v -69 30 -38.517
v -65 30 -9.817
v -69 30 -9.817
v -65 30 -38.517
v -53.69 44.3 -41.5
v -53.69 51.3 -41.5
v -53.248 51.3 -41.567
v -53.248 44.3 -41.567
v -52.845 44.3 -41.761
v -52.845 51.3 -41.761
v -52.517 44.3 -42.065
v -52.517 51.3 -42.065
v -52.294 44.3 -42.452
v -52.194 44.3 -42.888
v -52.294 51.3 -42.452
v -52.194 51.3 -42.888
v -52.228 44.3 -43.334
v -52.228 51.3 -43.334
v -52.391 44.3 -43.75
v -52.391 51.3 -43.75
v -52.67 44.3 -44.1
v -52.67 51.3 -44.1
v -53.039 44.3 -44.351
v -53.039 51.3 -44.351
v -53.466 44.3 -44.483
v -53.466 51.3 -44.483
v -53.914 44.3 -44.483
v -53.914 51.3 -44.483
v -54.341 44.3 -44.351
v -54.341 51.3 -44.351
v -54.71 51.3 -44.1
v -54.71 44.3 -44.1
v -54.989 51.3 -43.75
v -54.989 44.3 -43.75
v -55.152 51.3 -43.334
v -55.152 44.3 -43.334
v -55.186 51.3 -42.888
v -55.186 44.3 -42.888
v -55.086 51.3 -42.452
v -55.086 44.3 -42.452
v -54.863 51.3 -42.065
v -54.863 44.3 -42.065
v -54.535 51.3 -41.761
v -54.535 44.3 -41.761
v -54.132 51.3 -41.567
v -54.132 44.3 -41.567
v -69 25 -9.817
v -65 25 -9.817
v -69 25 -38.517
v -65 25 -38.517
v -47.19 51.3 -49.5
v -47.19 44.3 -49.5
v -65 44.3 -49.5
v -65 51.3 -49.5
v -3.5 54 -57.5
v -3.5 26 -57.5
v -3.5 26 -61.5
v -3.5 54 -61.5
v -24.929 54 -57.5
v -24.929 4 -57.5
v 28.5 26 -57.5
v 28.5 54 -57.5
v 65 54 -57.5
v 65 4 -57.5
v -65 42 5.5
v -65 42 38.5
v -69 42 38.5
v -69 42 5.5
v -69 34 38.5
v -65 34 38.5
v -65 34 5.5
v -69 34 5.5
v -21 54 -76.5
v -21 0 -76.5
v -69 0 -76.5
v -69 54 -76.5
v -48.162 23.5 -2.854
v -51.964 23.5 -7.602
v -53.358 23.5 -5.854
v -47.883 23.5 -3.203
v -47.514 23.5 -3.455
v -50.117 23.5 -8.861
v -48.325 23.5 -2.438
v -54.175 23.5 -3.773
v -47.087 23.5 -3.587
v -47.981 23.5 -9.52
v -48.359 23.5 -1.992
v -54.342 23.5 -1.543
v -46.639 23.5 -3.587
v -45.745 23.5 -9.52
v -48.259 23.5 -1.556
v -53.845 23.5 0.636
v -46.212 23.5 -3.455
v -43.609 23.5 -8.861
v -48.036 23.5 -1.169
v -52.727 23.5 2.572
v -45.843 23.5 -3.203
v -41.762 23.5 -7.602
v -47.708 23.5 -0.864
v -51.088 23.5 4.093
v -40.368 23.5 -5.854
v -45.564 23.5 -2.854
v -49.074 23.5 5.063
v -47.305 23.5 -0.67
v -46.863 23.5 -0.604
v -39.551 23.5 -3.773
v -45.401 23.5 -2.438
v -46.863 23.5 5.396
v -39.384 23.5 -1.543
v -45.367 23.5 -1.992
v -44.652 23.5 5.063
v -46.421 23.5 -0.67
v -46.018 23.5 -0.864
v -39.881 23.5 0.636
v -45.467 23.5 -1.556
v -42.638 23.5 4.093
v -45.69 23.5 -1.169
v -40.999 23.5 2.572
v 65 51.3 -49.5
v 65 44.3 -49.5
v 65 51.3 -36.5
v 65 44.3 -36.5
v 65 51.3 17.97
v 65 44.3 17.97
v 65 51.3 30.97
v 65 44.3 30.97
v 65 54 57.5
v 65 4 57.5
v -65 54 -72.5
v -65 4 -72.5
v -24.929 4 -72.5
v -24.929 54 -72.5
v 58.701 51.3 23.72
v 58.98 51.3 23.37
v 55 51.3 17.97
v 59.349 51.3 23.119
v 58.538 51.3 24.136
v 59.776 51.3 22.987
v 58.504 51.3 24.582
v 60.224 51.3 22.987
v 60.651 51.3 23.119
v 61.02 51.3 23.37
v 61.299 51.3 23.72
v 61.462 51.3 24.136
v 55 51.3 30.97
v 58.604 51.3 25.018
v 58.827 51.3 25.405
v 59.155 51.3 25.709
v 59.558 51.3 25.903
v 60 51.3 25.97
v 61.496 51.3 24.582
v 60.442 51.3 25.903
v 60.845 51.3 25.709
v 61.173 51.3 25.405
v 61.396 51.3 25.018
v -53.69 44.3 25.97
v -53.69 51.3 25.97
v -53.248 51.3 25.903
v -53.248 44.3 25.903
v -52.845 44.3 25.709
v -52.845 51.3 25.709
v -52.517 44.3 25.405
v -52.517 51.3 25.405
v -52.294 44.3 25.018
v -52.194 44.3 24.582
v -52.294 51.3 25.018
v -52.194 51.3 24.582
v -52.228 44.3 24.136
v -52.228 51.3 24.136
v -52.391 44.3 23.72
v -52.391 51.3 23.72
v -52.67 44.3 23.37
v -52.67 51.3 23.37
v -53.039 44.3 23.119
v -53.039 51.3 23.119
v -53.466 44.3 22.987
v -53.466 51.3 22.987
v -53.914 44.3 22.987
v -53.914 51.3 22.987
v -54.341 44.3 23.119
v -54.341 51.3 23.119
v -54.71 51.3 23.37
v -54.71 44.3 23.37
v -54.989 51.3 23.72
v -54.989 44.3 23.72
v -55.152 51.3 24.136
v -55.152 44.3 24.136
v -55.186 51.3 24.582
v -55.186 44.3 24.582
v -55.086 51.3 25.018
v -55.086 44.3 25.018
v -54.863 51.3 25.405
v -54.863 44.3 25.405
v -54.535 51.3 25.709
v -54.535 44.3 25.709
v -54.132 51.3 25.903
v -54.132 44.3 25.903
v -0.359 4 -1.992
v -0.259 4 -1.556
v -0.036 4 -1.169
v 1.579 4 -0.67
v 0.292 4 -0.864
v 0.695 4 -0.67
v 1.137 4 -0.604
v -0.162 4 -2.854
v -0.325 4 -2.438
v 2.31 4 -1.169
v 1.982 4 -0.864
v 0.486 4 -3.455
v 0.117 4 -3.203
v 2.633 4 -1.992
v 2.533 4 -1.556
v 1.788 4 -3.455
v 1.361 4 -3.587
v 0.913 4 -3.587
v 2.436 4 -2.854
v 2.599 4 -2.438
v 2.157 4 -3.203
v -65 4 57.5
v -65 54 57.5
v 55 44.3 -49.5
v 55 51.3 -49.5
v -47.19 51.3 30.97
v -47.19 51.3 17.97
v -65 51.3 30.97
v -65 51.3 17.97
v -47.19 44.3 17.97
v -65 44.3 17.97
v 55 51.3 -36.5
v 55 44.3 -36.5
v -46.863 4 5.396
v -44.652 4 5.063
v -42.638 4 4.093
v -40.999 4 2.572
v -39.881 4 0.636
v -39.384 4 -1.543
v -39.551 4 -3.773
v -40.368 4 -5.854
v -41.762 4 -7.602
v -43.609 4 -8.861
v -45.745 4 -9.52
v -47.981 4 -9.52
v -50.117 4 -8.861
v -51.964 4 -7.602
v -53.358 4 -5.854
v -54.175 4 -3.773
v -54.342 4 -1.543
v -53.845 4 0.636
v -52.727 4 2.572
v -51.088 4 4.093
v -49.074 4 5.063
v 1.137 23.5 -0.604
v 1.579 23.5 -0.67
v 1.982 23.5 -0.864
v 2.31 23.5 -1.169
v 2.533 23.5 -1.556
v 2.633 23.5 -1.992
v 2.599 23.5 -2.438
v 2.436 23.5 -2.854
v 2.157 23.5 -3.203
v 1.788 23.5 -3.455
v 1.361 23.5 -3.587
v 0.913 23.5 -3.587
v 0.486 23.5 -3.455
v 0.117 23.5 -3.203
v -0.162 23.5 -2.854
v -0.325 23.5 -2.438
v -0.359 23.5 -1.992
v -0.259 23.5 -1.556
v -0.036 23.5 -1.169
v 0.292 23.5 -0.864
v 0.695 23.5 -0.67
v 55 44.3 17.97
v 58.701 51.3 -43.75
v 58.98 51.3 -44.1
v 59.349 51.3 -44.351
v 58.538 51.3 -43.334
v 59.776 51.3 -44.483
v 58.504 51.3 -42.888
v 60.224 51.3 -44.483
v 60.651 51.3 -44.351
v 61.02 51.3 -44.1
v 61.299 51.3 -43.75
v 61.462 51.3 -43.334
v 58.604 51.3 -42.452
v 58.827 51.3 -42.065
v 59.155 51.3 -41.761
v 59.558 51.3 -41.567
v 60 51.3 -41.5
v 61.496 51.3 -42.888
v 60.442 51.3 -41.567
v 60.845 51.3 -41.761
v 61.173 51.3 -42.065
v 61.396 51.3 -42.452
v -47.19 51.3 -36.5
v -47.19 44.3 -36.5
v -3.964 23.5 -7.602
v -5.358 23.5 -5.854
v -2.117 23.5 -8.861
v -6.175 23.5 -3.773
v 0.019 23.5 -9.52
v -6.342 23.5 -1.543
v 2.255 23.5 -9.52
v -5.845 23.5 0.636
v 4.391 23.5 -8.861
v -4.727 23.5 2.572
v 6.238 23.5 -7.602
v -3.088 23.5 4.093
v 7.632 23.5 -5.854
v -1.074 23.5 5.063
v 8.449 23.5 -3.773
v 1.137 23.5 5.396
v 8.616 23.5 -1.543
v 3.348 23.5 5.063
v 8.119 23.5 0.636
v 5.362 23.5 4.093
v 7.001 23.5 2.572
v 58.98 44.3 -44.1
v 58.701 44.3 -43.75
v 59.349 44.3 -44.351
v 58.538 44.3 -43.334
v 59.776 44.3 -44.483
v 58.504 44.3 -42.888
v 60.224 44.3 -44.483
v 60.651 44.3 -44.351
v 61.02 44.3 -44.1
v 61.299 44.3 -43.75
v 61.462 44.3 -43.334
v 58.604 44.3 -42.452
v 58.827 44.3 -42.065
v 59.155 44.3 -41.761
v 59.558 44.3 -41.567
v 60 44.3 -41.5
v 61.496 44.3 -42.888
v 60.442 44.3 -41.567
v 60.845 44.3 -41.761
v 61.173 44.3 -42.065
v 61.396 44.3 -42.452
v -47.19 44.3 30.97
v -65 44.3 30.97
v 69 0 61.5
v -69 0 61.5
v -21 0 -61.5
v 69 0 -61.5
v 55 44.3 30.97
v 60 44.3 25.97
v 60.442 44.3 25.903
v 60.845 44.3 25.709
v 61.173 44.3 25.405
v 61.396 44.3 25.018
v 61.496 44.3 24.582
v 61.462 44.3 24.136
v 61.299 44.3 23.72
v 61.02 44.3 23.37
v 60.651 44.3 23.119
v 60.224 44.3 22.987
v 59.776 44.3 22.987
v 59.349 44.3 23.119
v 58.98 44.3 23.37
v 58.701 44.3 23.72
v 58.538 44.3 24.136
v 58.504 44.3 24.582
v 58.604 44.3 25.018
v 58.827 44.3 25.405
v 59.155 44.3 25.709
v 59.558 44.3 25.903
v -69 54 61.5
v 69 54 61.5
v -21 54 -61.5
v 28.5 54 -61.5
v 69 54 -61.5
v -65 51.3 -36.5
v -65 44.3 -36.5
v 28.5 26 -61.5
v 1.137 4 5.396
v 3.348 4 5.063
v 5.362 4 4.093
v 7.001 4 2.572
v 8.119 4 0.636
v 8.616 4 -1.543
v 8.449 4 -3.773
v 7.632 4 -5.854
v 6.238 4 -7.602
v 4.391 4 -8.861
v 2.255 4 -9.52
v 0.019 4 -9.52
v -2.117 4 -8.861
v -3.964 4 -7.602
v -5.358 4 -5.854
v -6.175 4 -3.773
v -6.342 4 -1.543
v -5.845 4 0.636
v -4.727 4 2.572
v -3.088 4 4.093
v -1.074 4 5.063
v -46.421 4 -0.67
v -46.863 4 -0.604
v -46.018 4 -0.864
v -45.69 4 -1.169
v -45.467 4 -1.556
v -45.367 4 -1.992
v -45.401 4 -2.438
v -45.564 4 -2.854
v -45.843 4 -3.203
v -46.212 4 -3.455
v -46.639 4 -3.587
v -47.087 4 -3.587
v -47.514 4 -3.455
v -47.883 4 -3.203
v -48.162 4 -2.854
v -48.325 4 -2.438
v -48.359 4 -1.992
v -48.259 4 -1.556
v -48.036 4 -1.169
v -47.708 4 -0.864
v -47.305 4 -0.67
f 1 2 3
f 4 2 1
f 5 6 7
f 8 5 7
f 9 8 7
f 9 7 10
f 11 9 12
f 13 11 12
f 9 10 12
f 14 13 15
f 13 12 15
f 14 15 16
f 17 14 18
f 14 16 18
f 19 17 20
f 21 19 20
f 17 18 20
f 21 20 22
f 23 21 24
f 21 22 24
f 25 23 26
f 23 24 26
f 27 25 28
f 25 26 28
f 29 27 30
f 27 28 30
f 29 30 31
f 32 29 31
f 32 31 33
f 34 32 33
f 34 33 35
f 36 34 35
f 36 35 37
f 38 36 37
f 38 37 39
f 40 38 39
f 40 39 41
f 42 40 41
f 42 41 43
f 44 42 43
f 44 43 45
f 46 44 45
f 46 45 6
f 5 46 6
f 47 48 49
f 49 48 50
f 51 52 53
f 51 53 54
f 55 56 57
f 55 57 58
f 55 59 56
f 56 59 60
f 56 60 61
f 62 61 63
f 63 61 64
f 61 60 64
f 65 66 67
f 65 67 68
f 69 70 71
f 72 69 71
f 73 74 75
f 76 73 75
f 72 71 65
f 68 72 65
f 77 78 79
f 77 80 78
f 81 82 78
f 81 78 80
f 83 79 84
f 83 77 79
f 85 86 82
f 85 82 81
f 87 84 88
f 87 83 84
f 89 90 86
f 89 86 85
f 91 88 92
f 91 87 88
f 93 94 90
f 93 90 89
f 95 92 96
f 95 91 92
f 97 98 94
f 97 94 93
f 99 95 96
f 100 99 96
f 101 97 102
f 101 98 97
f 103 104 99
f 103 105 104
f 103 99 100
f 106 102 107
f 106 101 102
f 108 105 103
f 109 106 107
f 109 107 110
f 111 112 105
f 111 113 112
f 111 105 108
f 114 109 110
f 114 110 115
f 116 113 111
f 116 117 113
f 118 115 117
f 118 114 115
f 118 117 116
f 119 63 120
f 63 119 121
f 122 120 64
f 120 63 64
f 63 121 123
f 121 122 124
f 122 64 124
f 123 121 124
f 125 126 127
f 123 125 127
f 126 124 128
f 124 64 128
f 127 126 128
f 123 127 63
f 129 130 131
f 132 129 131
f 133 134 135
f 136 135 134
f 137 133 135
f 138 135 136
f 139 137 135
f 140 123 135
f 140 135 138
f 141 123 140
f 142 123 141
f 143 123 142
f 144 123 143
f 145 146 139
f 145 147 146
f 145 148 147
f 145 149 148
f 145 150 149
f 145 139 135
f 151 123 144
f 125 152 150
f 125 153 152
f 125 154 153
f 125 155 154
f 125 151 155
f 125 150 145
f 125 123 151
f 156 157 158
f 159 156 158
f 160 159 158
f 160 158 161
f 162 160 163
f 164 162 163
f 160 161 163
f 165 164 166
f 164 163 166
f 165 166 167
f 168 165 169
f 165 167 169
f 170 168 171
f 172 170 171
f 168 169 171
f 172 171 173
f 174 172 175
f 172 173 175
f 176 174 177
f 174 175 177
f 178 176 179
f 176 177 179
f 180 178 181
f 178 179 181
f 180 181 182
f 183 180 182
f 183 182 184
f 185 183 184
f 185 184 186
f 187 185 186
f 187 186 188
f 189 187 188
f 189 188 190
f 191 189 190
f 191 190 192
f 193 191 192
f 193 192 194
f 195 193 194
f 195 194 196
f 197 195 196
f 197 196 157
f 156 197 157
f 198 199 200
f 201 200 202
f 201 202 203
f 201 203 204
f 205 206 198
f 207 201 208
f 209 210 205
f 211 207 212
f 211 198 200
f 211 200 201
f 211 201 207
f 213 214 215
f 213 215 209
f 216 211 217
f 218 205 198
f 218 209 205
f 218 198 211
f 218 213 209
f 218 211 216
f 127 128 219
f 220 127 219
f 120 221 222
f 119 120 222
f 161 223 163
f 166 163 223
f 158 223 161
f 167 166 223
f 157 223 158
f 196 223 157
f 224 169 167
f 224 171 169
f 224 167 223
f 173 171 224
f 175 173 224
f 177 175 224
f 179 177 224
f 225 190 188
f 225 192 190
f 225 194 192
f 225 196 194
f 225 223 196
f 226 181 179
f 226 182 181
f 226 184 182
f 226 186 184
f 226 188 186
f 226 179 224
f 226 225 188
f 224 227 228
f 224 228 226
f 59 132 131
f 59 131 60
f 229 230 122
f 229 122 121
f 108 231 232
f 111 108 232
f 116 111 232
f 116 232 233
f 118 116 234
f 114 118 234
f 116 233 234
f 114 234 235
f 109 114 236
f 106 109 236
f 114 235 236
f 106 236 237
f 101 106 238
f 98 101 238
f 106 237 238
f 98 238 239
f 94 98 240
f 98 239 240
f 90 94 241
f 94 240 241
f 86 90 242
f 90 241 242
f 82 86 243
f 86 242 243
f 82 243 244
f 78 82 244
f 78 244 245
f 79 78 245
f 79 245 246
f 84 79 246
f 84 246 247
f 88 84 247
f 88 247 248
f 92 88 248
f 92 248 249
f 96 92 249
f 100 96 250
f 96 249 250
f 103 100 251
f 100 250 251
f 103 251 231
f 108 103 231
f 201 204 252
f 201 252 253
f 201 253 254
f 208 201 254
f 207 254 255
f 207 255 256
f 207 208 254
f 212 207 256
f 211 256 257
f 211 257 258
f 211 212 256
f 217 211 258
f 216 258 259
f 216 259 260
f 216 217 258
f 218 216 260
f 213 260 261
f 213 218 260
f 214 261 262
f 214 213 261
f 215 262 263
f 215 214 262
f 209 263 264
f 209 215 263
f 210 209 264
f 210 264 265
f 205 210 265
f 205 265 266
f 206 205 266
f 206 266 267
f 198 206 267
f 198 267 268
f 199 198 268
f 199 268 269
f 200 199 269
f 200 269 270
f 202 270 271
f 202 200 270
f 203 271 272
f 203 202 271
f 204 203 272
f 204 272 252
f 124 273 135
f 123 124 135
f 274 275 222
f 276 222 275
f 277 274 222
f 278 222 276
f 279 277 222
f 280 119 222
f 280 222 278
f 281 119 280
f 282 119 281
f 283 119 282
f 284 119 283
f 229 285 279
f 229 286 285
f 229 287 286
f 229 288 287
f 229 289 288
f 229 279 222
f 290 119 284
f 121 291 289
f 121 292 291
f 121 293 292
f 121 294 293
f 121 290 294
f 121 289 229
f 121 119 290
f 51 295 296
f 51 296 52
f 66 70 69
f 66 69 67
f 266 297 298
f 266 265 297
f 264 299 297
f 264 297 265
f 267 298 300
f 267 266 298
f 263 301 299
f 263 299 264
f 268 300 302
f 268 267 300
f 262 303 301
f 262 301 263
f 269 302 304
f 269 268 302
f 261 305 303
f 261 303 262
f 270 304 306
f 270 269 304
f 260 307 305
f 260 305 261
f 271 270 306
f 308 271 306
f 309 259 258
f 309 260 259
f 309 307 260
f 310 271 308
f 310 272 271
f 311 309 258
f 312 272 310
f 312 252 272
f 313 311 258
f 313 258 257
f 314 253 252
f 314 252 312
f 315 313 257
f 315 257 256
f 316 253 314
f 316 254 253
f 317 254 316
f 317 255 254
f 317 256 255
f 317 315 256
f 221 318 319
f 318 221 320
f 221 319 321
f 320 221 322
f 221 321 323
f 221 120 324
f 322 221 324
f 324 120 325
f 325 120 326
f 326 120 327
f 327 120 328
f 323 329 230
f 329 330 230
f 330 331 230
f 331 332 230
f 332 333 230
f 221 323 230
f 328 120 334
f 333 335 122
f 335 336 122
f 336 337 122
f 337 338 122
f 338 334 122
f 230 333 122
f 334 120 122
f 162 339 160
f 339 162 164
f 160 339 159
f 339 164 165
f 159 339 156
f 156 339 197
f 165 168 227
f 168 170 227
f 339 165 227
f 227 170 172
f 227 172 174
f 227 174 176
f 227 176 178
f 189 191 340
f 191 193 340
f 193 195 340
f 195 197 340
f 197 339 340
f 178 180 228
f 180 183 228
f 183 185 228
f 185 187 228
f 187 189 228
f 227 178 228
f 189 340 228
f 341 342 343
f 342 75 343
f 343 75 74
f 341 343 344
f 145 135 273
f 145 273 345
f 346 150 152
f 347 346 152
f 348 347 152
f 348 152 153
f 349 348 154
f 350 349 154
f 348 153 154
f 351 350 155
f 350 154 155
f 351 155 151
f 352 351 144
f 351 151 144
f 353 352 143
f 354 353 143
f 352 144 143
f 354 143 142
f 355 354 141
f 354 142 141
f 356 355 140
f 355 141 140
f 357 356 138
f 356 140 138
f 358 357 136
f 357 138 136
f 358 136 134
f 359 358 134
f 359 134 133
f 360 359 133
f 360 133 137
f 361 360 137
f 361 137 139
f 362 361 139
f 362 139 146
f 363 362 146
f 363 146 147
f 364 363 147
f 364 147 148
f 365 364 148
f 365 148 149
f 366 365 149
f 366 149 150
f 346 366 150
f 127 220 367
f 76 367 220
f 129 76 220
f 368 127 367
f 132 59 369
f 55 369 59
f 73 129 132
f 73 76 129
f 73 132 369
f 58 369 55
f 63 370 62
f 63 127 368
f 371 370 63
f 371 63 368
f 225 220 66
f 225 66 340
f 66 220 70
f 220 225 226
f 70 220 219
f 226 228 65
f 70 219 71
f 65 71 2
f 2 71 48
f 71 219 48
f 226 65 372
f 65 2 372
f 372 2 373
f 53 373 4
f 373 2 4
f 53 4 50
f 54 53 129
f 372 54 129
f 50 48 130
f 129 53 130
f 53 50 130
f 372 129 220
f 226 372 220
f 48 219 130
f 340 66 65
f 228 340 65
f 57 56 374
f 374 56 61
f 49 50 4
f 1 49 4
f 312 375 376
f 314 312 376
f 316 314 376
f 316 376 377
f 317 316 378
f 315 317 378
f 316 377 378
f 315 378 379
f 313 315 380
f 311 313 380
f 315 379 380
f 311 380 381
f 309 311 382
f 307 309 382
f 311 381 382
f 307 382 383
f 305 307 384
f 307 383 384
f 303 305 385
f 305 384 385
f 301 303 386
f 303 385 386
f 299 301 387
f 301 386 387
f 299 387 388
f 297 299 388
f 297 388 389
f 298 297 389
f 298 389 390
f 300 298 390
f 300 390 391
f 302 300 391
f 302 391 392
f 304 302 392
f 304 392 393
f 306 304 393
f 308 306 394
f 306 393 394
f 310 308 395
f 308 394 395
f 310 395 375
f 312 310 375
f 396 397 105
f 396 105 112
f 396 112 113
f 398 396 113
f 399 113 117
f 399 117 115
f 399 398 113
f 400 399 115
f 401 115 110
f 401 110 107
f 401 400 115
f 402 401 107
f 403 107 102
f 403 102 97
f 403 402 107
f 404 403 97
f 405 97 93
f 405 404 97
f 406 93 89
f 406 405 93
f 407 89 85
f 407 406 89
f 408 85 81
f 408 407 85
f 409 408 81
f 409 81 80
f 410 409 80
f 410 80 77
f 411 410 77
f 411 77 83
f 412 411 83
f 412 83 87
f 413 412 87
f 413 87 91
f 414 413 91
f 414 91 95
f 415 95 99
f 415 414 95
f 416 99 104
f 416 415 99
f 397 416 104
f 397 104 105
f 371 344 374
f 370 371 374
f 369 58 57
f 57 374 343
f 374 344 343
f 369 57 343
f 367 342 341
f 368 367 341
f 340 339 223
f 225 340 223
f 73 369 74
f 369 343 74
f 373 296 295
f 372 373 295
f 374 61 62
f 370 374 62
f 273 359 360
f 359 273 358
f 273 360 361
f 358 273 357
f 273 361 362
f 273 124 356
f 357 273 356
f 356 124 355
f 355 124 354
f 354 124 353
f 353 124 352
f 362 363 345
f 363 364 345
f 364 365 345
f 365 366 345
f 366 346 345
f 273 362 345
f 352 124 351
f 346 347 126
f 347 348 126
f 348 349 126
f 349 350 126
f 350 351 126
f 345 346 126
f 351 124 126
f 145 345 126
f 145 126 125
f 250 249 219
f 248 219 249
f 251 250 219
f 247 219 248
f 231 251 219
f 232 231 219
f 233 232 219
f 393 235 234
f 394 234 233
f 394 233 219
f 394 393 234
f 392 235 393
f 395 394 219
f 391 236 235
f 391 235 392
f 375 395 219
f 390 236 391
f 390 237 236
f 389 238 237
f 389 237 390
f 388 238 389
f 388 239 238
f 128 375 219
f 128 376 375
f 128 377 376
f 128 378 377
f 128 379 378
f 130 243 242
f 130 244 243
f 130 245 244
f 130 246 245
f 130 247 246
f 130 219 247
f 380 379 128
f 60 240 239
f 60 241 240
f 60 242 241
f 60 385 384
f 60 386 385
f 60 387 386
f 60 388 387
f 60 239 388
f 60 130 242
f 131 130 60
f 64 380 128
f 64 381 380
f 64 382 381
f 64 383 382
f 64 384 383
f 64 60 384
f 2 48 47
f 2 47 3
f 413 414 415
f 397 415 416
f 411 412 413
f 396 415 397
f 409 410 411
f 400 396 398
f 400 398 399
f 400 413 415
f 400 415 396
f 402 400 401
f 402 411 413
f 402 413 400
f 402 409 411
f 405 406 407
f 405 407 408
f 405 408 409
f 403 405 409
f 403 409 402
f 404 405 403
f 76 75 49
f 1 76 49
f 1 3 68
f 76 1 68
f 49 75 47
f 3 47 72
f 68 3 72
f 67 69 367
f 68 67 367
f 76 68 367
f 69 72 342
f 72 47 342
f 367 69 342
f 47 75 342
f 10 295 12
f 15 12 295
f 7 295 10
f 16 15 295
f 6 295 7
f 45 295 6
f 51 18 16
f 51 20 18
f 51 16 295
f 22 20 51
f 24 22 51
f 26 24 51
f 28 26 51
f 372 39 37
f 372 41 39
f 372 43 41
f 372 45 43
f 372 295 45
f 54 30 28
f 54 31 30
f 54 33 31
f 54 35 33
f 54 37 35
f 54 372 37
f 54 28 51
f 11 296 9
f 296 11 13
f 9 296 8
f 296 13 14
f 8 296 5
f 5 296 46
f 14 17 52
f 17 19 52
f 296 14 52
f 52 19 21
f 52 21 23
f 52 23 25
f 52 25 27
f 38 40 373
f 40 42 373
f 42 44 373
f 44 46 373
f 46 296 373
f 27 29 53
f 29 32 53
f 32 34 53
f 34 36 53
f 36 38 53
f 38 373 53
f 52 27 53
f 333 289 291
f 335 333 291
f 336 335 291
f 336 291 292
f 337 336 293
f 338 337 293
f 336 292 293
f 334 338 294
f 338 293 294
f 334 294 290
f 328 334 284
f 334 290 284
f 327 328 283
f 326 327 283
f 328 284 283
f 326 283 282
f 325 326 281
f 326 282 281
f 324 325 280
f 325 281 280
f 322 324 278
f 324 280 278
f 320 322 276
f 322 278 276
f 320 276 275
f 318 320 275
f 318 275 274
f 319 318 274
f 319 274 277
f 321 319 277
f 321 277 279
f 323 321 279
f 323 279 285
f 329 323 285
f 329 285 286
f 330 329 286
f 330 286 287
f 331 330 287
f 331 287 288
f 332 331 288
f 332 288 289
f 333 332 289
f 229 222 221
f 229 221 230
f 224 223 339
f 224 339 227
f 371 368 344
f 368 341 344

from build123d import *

# Parameters (mm, degrees)
BOSS_EXTRUDE1_DEPTH = 4
BOSS_EXTRUDE2_START = 4
BOSS_EXTRUDE2_DEPTH = 50
SKETCH3_R           = 7.5
SKETCH3_R_2         = 1.5
BOSS_EXTRUDE3_DEPTH = 19.5
SKETCH4_W           = 13
SKETCH4_H           = 7
BOSS_EXTRUDE4_DEPTH = 17.81
SKETCH5_W           = 13
SKETCH5_H           = 7
BOSS_EXTRUDE5_DEPTH = 10
CUT_EXTRUDE1_REACH  = 117.087
SKETCH6_R           = 1.5
CUT_EXTRUDE2_REACH  = 149.777
SKETCH7_W           = 32
SKETCH7_H           = 28
CUT_EXTRUDE3_REACH  = 165.476
SKETCH8_W           = 33
SKETCH8_H           = 8
SKETCH8_W_2         = 28.7
SKETCH8_H_2         = 5


with BuildPart() as part:
    # Sketch1 → Boss-Extrude1 (new body)
    with BuildSketch(Plane(origin=(0, 0, 0), x_dir=(1, 0, 0), z_dir=(0, 1, 0))):
        Polygon((-69, -61.5), (69, -61.5), (69, 61.5), (-21, 61.5), (-21, 76.5), (-69, 76.5), (-69, 61.5), align=None)
    extrude(amount=BOSS_EXTRUDE1_DEPTH)

    # Sketch1<5> → Boss-Extrude2 (add)
    with BuildSketch(Plane(origin=(0, 0, 0), x_dir=(1, 0, 0), z_dir=(0, 1, 0)).offset(BOSS_EXTRUDE2_START)):
        Polygon((-69, 61.5), (-69, -61.5), (69, -61.5), (69, 61.5), (-21, 61.5), (-21, 76.5), (-69, 76.5), align=None)
        Polygon((-65, -57.5), (-65, 57.5), (-65, 72.5), (-24.92925867, 72.5), (-24.92925867, 57.5), (65, 57.5), (65, -57.5), align=None, mode=Mode.SUBTRACT)
    extrude(amount=BOSS_EXTRUDE2_DEPTH)

    # Sketch3 → Boss-Extrude3 (add)
    # profile 1 of 2: a face of its own
    with BuildSketch(Plane(origin=(0, 4, 0), x_dir=(1, 0, 0), z_dir=(0, 1, 0))):
        with Locations(Location((-46.862948708, 2.10374449, 0), (0, 0, 270))):
            Circle(SKETCH3_R)
        with Locations(Location((-46.862948708, 2.10374449, 0), (0, 0, 270))):
            Circle(SKETCH3_R_2, mode=Mode.SUBTRACT)
    # profile 2 of 2: a face of its own
    with BuildSketch(Plane(origin=(0, 4, 0), x_dir=(1, 0, 0), z_dir=(0, 1, 0))):
        with Locations(Location((1.137051292, 2.10374449, 0), (0, 0, 270))):
            Circle(SKETCH3_R)
        with Locations(Location((1.137051292, 2.10374449, 0), (0, 0, 270))):
            Circle(SKETCH3_R_2, mode=Mode.SUBTRACT)
    extrude(amount=BOSS_EXTRUDE3_DEPTH)

    # Sketch4 → Boss-Extrude4 (add)
    with BuildSketch(Plane(origin=(-65, 0, 0), x_dir=(0, 0, -1), z_dir=(1, 0, 0))):
        with Locations((-24.47, 47.8)):
            Rectangle(SKETCH4_W, SKETCH4_H)
        with Locations((43, 47.8)):
            Rectangle(SKETCH4_W, SKETCH4_H)
    extrude(amount=BOSS_EXTRUDE4_DEPTH)

    # Sketch5 → Boss-Extrude5 (add)
    with BuildSketch(Plane.ZY.offset(-65)):
        with Locations((24.47, 47.8)):
            Rectangle(SKETCH5_W, SKETCH5_H)
        with Locations((-43, 47.8)):
            Rectangle(SKETCH5_W, SKETCH5_H)
    extrude(amount=BOSS_EXTRUDE5_DEPTH)

    # Sketch6 → Cut-Extrude1 (cut, up to next)
    with BuildSketch(Plane(origin=(0, 51.3, 0), x_dir=(1, 0, 0), z_dir=(0, 1, 0)), mode=Mode.PRIVATE) as cut_extrude1_sk1:
        with Locations(Location((-53.69, 43, 0), (0, 0, 270))):
            Circle(SKETCH6_R)
    cut_extrude1_tool1 = extrude(cut_extrude1_sk1.sketch, amount=-CUT_EXTRUDE1_REACH, mode=Mode.PRIVATE) & part.part
    # Sketch6 → Cut-Extrude1 (cut, up to next)
    with BuildSketch(Plane(origin=(0, 51.3, 0), x_dir=(1, 0, 0), z_dir=(0, 1, 0)), mode=Mode.PRIVATE) as cut_extrude1_sk2:
        with Locations(Location((-53.69, -24.47, 0), (0, 0, 270))):
            Circle(SKETCH6_R)
    cut_extrude1_tool2 = extrude(cut_extrude1_sk2.sketch, amount=-CUT_EXTRUDE1_REACH, mode=Mode.PRIVATE) & part.part
    # Sketch6 → Cut-Extrude1 (cut, up to next)
    with BuildSketch(Plane(origin=(0, 51.3, 0), x_dir=(1, 0, 0), z_dir=(0, 1, 0)), mode=Mode.PRIVATE) as cut_extrude1_sk3:
        with Locations(Location((60, -24.47, 0), (0, 0, 270))):
            Circle(SKETCH6_R)
    cut_extrude1_tool3 = extrude(cut_extrude1_sk3.sketch, amount=-CUT_EXTRUDE1_REACH, mode=Mode.PRIVATE) & part.part
    # Sketch6 → Cut-Extrude1 (cut, up to next)
    with BuildSketch(Plane(origin=(0, 51.3, 0), x_dir=(1, 0, 0), z_dir=(0, 1, 0)), mode=Mode.PRIVATE) as cut_extrude1_sk4:
        with Locations(Location((60, 43, 0), (0, 0, 270))):
            Circle(SKETCH6_R)
    cut_extrude1_tool4 = extrude(cut_extrude1_sk4.sketch, amount=-CUT_EXTRUDE1_REACH, mode=Mode.PRIVATE) & part.part
    add(cut_extrude1_tool1.solids().sort_by_distance((-53.69, 51.3, -43))[0], mode=Mode.SUBTRACT)
    add(cut_extrude1_tool2.solids().sort_by_distance((-53.69, 51.3, 24.47))[0], mode=Mode.SUBTRACT)
    add(cut_extrude1_tool3.solids().sort_by_distance((60, 51.3, 24.47))[0], mode=Mode.SUBTRACT)
    add(cut_extrude1_tool4.solids().sort_by_distance((60, 51.3, -43))[0], mode=Mode.SUBTRACT)

    # Sketch7 → Cut-Extrude2 (cut, up to next)
    with BuildSketch(Plane.XY.offset(-57.5), mode=Mode.PRIVATE) as cut_extrude2_sk1:
        with Locations((12.5, 40)):
            Rectangle(SKETCH7_W, SKETCH7_H)
    cut_extrude2_tool1 = extrude(cut_extrude2_sk1.sketch, amount=-CUT_EXTRUDE2_REACH, mode=Mode.PRIVATE) & part.part
    add(cut_extrude2_tool1.solids().sort_by_distance((12.5, 40, -57.5))[0], mode=Mode.SUBTRACT)

    # Sketch8 → Cut-Extrude3 (cut, up to next)
    with BuildSketch(Plane(origin=(-65, 0, 0), x_dir=(0, 0, -1), z_dir=(1, 0, 0)), mode=Mode.PRIVATE) as cut_extrude3_sk1:
        with Locations((-22, 38)):
            Rectangle(SKETCH8_W, SKETCH8_H)
    cut_extrude3_tool1 = extrude(cut_extrude3_sk1.sketch, amount=-CUT_EXTRUDE3_REACH, mode=Mode.PRIVATE) & part.part
    # Sketch8 → Cut-Extrude3 (cut, up to next)
    with BuildSketch(Plane(origin=(-65, 0, 0), x_dir=(0, 0, -1), z_dir=(1, 0, 0)), mode=Mode.PRIVATE) as cut_extrude3_sk2:
        with Locations((24.167352626, 27.5)):
            Rectangle(SKETCH8_W_2, SKETCH8_H_2)
    cut_extrude3_tool2 = extrude(cut_extrude3_sk2.sketch, amount=-CUT_EXTRUDE3_REACH, mode=Mode.PRIVATE) & part.part
    add(cut_extrude3_tool1.solids().sort_by_distance((-65, 38, 22))[0], mode=Mode.SUBTRACT)
    add(cut_extrude3_tool2.solids().sort_by_distance((-65, 27.5, -24.167353))[0], mode=Mode.SUBTRACT)


solid = part.part
